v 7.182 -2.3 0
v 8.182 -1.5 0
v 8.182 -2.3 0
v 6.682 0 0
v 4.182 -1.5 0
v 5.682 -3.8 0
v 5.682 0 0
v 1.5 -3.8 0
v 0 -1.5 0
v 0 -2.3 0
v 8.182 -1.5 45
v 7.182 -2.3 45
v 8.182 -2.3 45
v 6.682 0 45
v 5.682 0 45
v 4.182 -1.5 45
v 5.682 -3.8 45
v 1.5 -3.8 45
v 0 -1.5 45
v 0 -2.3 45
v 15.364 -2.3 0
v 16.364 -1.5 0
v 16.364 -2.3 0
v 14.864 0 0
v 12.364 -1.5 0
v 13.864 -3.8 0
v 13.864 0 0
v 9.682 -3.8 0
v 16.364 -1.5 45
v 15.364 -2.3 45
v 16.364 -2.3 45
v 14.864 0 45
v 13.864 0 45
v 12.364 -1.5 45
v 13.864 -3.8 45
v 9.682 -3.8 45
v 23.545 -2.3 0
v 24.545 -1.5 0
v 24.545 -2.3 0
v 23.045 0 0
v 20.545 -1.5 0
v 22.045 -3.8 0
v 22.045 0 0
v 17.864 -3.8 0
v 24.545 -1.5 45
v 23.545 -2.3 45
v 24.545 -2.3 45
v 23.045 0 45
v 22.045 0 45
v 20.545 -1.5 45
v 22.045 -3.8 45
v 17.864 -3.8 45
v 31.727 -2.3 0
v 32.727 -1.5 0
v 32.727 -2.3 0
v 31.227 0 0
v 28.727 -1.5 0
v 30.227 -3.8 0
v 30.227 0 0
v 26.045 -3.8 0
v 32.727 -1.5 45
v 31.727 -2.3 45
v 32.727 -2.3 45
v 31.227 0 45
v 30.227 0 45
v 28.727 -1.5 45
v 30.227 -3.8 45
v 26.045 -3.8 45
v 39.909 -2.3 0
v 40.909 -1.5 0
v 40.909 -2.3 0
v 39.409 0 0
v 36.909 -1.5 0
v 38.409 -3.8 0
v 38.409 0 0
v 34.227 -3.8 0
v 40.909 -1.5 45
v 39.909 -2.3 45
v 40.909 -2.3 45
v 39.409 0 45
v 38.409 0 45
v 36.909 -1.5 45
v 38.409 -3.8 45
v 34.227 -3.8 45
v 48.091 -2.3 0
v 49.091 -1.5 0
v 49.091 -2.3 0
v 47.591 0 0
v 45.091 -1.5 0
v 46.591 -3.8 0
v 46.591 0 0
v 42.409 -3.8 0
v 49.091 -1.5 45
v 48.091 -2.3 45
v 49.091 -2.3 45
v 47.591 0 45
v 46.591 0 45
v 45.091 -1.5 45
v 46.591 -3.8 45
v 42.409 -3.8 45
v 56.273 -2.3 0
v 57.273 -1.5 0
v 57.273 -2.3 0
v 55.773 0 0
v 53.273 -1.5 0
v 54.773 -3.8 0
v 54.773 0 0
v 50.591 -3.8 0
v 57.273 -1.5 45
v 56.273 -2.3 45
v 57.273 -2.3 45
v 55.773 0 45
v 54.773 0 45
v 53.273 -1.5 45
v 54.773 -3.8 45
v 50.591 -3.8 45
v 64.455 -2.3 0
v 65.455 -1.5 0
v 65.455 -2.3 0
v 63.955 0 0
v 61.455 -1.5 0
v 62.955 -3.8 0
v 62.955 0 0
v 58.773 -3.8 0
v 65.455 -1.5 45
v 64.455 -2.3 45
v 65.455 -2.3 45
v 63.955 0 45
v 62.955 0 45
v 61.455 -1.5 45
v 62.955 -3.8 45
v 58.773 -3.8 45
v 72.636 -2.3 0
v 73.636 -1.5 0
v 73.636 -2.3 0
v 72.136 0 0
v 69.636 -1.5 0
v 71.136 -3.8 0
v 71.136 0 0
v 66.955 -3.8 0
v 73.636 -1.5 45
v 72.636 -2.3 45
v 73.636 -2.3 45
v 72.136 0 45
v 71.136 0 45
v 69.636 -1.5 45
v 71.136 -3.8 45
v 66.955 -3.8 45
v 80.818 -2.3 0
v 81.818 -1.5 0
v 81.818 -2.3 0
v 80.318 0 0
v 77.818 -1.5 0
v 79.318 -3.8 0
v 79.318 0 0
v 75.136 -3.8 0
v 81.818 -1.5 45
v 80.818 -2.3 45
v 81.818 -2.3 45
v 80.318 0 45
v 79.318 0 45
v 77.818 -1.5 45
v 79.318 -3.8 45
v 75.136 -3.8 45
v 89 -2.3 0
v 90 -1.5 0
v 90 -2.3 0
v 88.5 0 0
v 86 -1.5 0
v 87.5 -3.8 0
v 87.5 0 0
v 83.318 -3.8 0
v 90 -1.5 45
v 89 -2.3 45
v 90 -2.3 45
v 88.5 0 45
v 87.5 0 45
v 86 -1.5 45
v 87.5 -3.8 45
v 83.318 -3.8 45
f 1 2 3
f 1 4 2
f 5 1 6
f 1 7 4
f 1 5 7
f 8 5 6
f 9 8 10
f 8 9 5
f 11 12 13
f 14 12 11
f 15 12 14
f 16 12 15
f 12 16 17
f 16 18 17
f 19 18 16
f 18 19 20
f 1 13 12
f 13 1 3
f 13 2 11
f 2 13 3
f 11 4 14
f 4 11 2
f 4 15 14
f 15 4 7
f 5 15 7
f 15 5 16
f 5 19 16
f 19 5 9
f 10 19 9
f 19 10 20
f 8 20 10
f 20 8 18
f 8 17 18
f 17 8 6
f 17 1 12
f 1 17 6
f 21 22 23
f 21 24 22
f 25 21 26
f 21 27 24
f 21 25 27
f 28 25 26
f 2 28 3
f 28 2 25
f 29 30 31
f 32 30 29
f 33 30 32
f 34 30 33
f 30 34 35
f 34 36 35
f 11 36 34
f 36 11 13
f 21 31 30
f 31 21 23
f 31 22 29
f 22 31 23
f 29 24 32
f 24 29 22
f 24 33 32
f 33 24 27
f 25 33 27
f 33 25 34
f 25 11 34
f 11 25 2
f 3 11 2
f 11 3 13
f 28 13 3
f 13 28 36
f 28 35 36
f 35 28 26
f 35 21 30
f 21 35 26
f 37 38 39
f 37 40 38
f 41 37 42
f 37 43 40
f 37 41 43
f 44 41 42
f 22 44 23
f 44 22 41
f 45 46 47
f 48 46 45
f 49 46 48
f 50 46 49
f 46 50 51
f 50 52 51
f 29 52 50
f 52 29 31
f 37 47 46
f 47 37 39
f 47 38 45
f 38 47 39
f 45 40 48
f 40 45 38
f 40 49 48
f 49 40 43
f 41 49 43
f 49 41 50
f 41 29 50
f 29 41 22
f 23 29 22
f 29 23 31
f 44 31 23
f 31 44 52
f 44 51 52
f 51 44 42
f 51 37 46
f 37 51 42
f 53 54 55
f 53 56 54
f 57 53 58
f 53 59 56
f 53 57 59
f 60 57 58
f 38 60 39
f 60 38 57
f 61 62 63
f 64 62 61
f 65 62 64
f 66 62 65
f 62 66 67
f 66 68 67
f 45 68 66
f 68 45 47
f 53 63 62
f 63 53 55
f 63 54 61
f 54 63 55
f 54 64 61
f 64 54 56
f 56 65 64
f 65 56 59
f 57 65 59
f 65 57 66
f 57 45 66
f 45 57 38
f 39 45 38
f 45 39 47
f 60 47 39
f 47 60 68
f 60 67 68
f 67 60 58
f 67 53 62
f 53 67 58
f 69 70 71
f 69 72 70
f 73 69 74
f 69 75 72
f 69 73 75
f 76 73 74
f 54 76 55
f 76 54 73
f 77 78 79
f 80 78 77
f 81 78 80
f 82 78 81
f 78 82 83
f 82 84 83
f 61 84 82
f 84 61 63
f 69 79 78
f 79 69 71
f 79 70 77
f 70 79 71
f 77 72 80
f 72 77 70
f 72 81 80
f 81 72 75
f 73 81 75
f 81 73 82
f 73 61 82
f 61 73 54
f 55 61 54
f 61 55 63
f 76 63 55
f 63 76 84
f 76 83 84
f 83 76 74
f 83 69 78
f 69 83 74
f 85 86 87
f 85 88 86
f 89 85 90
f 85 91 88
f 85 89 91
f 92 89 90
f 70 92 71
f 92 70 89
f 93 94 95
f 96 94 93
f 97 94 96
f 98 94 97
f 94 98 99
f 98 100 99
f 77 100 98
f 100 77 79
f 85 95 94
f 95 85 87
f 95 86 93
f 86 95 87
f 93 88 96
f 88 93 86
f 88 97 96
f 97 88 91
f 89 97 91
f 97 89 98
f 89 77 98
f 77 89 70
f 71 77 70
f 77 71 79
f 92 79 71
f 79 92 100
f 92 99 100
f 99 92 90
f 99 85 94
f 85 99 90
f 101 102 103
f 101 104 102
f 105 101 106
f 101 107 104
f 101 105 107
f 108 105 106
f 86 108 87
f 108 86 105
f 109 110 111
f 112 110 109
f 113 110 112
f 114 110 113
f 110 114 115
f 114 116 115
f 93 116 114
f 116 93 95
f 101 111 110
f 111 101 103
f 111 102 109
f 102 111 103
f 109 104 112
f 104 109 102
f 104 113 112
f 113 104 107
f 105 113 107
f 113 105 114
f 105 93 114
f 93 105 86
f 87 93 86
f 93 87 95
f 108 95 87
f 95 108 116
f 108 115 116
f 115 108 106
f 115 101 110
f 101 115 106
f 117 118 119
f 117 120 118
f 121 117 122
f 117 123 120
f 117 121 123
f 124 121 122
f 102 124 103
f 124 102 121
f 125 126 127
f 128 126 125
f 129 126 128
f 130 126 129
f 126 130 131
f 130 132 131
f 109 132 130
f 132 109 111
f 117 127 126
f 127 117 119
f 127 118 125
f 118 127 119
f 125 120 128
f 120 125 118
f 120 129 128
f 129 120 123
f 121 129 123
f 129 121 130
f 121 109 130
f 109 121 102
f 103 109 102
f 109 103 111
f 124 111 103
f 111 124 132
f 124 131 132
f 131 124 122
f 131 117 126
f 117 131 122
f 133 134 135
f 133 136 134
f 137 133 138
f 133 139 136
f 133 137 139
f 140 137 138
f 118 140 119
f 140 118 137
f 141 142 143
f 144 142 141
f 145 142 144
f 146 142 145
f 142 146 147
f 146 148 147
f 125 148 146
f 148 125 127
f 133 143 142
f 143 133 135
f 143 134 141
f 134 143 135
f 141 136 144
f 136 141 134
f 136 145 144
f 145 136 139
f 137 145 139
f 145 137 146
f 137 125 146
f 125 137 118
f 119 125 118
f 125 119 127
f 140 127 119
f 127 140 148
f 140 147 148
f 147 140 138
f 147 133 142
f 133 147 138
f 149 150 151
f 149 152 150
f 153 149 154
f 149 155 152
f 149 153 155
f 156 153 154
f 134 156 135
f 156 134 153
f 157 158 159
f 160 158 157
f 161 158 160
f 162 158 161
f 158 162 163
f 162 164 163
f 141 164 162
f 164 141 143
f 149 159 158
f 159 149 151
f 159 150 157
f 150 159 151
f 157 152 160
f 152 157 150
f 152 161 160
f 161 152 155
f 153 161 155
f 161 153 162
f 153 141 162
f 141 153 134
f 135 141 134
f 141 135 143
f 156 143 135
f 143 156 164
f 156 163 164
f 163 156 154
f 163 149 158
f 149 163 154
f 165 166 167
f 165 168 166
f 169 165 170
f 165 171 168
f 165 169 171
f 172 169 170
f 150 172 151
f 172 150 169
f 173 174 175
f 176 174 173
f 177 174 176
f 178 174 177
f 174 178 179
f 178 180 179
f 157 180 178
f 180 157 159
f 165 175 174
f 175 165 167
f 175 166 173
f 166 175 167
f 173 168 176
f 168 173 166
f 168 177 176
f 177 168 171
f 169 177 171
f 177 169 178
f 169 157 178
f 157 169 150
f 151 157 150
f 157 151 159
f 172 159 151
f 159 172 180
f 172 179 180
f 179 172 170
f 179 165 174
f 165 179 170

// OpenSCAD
containerWall2();

/* simpleContainerWall() -- corrugated metal wall
 *
 * NOTE: Wall is positioned such that bottom left is at x=0,z=0, and back
 *       of wall is on y axis, but back left bottom corner is not at origin
 *       because of the shape of the wall.
 */
module simpleContainerWall(height = 45, length = 90) {
   containerWall(height=height, length=length, flat=3.0, ow=1.5, ot=1.5);
}

module containerWall(height = 45, length = 90, flat=3.0, ow=1.5, ot=1.5) {
   thickness = 0.8;
   reqFlatLen = flat; // requested flat length, possibly adjusted
   ptOffW = 1.0; // width
   ptOffT = 1.5; // thick

   origPanelLen = 2*(reqFlatLen + ptOffW);
   panelCount = floor(length/origPanelLen);

   /* tweak panel length to hit overall length target */
   diff = length - panelCount*origPanelLen;
   flatLen = reqFlatLen + diff / (panelCount*2); // two flatLens per panel
   newPanelLen = 2*(flatLen+ptOffW);

   for (i = [ 0 : panelCount - 1 ]) {
      translate([i * newPanelLen, -1*(ptOffT), 0])
         linear_extrude(height = height) {
            polygon(points = [[0,0],
                              [flatLen, 0],
                              [flatLen + ptOffW, ptOffT],
                              [2*flatLen + ptOffW, ptOffT],
                              [2*flatLen + 2*ptOffW, 0],
                              [2*flatLen + 2*ptOffW, ptOffT - thickness],
                              [2*flatLen + 2*ptOffW, -1* thickness],
                              [flatLen+2*ptOffW,-1* thickness],
                              [flatLen+ptOffW,-1*(ptOffT+thickness)],
                              [ptOffW,-1*(ptOffT+thickness)],
                              [0,-1*thickness]]);
        }
   }
}

/* containerWall2() -- asymmetric */
module containerWall2(height = 45, length = 90, bigFlat=4.0, littleFlat=1.0,
                      ow=1.5, ot=1.5)
{
   thickness = 0.8;
   reqFlatLen = bigFlat; // requested flat length, possibly adjusted
   ptOffW = ow; // width
   ptOffT = ot; // thick
   littleFlatLen = littleFlat;

   origPanelLen = reqFlatLen + 2*ptOffW + littleFlatLen;
   panelCount = floor(length/origPanelLen);

   /* tweak panel length to hit overall length target */
   diff = length - panelCount*origPanelLen;
   flatLen = reqFlatLen + diff / (panelCount); // two flatLens per panel
   newPanelLen = flatLen + 2*ptOffW + littleFlatLen;

   for (i = [ 0 : panelCount - 1 ]) {
      translate([i * newPanelLen, -1*(ptOffT), 0])
         linear_extrude(height = height) {
            polygon(points = [[0,0],
                              [flatLen, 0],
                              [flatLen + ptOffW, ptOffT],
                              [flatLen + ptOffW + littleFlatLen, ptOffT],
                              [flatLen + 2*ptOffW + littleFlatLen, 0],
                              [flatLen + 2*ptOffW + littleFlatLen, ptOffT - thickness],
                              [flatLen + 2*ptOffW + littleFlatLen, -1* thickness],
                              [flatLen+2*ptOffW,-1* thickness],
                              [flatLen+ptOffW,-1*(ptOffT+thickness)],
                              [ptOffW,-1*(ptOffT+thickness)],
                              [0,-1*thickness]]);
        }
   }
}
